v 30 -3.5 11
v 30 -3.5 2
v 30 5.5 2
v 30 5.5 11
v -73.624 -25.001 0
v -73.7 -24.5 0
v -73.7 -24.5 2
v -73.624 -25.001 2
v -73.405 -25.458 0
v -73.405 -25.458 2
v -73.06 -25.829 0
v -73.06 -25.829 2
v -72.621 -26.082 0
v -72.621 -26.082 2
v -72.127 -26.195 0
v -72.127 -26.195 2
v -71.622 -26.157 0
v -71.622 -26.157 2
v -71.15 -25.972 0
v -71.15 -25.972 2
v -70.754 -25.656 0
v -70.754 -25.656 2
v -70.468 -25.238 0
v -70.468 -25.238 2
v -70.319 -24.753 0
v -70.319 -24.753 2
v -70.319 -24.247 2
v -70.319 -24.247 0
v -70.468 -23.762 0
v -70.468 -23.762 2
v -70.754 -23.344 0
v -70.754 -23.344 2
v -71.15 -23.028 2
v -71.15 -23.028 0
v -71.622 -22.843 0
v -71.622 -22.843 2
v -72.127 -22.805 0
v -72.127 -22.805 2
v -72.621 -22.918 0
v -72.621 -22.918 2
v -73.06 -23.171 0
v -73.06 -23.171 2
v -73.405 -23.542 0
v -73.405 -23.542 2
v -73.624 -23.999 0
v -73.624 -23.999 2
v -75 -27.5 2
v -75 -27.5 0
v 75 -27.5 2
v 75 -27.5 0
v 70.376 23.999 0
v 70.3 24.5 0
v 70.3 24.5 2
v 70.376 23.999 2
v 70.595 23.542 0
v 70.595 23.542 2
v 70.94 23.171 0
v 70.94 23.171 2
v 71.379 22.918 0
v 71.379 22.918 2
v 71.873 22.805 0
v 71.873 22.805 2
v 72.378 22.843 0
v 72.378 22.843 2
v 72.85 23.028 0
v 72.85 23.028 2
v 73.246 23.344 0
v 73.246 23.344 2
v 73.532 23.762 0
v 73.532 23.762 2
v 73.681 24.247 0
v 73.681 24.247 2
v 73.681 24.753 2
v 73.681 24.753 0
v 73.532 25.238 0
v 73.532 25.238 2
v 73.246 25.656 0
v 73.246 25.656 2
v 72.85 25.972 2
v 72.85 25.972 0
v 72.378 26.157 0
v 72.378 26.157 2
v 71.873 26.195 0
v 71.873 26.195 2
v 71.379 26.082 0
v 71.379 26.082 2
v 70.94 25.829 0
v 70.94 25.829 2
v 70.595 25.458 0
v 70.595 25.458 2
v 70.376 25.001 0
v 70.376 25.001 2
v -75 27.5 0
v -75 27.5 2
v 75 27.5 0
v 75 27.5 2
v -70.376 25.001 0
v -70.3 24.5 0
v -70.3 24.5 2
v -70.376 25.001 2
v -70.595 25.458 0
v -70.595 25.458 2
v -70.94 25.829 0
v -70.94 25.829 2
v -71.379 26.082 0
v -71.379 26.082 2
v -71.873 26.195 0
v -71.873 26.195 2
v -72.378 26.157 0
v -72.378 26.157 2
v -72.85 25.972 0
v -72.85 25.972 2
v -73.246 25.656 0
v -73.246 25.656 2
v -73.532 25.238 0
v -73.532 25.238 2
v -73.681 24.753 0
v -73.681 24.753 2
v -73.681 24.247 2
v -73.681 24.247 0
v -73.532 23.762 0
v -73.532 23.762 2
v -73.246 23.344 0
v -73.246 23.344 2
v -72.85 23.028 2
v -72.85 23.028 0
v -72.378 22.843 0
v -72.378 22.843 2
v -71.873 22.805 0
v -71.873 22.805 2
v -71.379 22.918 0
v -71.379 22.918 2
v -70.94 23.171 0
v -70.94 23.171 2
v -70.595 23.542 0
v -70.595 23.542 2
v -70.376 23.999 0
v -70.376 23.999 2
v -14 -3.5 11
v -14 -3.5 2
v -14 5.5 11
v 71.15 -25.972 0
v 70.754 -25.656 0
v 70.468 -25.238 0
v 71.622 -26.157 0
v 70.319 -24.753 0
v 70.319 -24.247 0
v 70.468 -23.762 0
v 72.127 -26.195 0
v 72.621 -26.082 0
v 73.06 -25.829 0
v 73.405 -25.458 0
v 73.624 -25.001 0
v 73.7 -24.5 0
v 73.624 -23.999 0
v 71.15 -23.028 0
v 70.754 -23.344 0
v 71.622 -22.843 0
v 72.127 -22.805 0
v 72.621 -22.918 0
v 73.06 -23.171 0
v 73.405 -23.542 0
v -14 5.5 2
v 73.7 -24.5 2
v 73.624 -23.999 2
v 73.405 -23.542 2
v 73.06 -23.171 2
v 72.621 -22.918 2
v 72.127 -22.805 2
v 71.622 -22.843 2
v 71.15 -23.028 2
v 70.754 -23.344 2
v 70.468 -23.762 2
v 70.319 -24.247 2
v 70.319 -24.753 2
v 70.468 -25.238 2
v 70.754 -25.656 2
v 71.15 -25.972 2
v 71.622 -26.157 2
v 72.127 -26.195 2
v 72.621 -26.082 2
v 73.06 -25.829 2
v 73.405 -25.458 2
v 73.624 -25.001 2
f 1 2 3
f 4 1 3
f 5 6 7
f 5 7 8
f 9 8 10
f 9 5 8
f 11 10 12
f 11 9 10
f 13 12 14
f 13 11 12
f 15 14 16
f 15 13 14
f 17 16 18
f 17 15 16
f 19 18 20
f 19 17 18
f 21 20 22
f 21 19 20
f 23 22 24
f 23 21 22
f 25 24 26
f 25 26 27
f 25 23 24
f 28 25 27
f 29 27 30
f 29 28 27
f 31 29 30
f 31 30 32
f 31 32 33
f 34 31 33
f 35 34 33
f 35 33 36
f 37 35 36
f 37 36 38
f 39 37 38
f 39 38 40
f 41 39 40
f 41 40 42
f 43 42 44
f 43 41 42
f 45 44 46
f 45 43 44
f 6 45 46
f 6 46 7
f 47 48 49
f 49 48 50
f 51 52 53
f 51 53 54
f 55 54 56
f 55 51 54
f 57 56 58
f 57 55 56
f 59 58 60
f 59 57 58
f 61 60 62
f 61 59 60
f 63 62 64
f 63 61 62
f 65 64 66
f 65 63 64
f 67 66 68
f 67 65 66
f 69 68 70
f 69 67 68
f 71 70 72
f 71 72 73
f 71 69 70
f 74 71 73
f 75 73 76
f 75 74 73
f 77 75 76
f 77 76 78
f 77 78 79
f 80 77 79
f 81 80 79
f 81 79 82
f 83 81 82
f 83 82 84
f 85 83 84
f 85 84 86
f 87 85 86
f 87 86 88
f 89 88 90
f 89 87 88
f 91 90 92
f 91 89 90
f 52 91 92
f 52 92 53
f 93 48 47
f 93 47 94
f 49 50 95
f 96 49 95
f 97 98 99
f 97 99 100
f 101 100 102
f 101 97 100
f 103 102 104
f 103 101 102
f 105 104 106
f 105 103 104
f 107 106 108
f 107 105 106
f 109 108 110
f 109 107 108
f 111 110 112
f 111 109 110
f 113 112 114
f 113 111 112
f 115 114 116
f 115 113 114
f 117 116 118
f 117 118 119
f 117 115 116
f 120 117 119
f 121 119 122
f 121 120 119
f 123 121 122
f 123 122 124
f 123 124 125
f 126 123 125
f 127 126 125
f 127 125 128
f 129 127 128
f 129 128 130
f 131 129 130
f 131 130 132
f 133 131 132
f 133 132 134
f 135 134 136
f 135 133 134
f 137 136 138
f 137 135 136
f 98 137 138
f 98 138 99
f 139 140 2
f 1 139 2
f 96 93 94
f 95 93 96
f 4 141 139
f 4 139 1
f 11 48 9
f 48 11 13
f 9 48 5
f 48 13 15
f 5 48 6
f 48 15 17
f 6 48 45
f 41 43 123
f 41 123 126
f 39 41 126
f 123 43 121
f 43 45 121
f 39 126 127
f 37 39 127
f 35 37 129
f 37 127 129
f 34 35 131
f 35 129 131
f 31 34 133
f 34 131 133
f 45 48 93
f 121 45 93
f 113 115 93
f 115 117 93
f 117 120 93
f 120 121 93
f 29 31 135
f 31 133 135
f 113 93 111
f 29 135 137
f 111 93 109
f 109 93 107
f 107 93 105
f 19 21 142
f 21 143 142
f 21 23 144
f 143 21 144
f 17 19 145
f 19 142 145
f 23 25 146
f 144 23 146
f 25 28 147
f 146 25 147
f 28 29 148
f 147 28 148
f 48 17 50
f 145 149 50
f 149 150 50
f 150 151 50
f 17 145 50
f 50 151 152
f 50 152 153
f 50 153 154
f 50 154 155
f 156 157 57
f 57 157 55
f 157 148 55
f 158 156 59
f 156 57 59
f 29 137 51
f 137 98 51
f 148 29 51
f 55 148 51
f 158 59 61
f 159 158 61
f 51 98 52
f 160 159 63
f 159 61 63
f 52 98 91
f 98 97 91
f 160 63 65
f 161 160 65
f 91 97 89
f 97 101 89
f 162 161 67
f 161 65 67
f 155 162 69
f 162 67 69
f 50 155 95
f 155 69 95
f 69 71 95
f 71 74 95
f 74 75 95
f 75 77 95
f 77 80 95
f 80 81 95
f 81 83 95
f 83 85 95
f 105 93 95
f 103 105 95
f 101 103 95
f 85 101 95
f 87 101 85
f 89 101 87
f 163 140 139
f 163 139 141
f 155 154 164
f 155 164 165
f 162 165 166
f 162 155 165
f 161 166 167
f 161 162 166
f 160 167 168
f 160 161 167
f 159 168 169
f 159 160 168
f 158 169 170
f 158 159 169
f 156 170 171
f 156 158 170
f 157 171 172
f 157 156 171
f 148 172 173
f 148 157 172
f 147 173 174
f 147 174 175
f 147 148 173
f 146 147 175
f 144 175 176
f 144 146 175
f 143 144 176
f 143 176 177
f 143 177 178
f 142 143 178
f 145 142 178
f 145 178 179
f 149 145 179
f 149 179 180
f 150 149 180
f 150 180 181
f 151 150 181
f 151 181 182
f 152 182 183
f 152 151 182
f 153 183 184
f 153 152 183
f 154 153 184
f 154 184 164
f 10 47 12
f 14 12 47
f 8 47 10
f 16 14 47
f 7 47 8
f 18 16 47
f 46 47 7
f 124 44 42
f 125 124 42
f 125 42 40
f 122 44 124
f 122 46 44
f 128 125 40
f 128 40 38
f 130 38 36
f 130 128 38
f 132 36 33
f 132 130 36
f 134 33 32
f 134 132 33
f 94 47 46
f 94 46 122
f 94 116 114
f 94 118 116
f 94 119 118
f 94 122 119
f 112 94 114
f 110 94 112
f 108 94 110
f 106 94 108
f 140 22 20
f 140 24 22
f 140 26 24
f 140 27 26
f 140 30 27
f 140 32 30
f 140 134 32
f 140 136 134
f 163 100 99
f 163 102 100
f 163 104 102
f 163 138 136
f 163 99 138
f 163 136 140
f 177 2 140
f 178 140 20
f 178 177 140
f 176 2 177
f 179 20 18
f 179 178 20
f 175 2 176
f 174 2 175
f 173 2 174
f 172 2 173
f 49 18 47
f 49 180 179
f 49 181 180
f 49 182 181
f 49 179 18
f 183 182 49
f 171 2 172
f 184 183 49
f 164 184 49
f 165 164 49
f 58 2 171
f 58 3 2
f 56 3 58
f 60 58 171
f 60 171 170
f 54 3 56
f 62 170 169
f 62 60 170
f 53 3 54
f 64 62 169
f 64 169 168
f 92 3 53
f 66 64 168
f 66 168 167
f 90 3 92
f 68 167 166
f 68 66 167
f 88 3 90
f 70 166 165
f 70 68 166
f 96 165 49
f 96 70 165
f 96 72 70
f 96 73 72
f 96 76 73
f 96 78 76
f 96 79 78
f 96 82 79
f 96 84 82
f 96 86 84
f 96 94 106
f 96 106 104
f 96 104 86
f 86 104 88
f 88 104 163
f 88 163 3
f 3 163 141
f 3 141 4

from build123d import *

# Parameters (mm, degrees)
SKETCH_1_W      = 150
SKETCH_1_H      = 55
SKETCH_1_R      = 1.7
EXTRUDE_1_DEPTH = 2
SKETCH_2_W      = 44
SKETCH_2_H      = 9
EXTRUDE_2_DEPTH = 9


with BuildPart() as part:
    # 草圖1 → 填料-伸長1 (new body)
    with BuildSketch(Plane.XY):
        Rectangle(SKETCH_1_W, SKETCH_1_H)
        with Locations((-72, 24.5)):
            Circle(SKETCH_1_R, mode=Mode.SUBTRACT)
        with Locations(Location((72, 24.5, 0), (0, 0, 180))):
            Circle(SKETCH_1_R, mode=Mode.SUBTRACT)
        with Locations((72, -24.5)):
            Circle(SKETCH_1_R, mode=Mode.SUBTRACT)
        with Locations(Location((-72, -24.5, 0), (0, 0, 180))):
            Circle(SKETCH_1_R, mode=Mode.SUBTRACT)
    extrude(amount=EXTRUDE_1_DEPTH)

    # 草圖2 → 填料-伸長2 (add)
    with BuildSketch(Plane.XY.offset(2)):
        with Locations((8, 1)):
            Rectangle(SKETCH_2_W, SKETCH_2_H)
    extrude(amount=EXTRUDE_2_DEPTH)


solid = part.part
